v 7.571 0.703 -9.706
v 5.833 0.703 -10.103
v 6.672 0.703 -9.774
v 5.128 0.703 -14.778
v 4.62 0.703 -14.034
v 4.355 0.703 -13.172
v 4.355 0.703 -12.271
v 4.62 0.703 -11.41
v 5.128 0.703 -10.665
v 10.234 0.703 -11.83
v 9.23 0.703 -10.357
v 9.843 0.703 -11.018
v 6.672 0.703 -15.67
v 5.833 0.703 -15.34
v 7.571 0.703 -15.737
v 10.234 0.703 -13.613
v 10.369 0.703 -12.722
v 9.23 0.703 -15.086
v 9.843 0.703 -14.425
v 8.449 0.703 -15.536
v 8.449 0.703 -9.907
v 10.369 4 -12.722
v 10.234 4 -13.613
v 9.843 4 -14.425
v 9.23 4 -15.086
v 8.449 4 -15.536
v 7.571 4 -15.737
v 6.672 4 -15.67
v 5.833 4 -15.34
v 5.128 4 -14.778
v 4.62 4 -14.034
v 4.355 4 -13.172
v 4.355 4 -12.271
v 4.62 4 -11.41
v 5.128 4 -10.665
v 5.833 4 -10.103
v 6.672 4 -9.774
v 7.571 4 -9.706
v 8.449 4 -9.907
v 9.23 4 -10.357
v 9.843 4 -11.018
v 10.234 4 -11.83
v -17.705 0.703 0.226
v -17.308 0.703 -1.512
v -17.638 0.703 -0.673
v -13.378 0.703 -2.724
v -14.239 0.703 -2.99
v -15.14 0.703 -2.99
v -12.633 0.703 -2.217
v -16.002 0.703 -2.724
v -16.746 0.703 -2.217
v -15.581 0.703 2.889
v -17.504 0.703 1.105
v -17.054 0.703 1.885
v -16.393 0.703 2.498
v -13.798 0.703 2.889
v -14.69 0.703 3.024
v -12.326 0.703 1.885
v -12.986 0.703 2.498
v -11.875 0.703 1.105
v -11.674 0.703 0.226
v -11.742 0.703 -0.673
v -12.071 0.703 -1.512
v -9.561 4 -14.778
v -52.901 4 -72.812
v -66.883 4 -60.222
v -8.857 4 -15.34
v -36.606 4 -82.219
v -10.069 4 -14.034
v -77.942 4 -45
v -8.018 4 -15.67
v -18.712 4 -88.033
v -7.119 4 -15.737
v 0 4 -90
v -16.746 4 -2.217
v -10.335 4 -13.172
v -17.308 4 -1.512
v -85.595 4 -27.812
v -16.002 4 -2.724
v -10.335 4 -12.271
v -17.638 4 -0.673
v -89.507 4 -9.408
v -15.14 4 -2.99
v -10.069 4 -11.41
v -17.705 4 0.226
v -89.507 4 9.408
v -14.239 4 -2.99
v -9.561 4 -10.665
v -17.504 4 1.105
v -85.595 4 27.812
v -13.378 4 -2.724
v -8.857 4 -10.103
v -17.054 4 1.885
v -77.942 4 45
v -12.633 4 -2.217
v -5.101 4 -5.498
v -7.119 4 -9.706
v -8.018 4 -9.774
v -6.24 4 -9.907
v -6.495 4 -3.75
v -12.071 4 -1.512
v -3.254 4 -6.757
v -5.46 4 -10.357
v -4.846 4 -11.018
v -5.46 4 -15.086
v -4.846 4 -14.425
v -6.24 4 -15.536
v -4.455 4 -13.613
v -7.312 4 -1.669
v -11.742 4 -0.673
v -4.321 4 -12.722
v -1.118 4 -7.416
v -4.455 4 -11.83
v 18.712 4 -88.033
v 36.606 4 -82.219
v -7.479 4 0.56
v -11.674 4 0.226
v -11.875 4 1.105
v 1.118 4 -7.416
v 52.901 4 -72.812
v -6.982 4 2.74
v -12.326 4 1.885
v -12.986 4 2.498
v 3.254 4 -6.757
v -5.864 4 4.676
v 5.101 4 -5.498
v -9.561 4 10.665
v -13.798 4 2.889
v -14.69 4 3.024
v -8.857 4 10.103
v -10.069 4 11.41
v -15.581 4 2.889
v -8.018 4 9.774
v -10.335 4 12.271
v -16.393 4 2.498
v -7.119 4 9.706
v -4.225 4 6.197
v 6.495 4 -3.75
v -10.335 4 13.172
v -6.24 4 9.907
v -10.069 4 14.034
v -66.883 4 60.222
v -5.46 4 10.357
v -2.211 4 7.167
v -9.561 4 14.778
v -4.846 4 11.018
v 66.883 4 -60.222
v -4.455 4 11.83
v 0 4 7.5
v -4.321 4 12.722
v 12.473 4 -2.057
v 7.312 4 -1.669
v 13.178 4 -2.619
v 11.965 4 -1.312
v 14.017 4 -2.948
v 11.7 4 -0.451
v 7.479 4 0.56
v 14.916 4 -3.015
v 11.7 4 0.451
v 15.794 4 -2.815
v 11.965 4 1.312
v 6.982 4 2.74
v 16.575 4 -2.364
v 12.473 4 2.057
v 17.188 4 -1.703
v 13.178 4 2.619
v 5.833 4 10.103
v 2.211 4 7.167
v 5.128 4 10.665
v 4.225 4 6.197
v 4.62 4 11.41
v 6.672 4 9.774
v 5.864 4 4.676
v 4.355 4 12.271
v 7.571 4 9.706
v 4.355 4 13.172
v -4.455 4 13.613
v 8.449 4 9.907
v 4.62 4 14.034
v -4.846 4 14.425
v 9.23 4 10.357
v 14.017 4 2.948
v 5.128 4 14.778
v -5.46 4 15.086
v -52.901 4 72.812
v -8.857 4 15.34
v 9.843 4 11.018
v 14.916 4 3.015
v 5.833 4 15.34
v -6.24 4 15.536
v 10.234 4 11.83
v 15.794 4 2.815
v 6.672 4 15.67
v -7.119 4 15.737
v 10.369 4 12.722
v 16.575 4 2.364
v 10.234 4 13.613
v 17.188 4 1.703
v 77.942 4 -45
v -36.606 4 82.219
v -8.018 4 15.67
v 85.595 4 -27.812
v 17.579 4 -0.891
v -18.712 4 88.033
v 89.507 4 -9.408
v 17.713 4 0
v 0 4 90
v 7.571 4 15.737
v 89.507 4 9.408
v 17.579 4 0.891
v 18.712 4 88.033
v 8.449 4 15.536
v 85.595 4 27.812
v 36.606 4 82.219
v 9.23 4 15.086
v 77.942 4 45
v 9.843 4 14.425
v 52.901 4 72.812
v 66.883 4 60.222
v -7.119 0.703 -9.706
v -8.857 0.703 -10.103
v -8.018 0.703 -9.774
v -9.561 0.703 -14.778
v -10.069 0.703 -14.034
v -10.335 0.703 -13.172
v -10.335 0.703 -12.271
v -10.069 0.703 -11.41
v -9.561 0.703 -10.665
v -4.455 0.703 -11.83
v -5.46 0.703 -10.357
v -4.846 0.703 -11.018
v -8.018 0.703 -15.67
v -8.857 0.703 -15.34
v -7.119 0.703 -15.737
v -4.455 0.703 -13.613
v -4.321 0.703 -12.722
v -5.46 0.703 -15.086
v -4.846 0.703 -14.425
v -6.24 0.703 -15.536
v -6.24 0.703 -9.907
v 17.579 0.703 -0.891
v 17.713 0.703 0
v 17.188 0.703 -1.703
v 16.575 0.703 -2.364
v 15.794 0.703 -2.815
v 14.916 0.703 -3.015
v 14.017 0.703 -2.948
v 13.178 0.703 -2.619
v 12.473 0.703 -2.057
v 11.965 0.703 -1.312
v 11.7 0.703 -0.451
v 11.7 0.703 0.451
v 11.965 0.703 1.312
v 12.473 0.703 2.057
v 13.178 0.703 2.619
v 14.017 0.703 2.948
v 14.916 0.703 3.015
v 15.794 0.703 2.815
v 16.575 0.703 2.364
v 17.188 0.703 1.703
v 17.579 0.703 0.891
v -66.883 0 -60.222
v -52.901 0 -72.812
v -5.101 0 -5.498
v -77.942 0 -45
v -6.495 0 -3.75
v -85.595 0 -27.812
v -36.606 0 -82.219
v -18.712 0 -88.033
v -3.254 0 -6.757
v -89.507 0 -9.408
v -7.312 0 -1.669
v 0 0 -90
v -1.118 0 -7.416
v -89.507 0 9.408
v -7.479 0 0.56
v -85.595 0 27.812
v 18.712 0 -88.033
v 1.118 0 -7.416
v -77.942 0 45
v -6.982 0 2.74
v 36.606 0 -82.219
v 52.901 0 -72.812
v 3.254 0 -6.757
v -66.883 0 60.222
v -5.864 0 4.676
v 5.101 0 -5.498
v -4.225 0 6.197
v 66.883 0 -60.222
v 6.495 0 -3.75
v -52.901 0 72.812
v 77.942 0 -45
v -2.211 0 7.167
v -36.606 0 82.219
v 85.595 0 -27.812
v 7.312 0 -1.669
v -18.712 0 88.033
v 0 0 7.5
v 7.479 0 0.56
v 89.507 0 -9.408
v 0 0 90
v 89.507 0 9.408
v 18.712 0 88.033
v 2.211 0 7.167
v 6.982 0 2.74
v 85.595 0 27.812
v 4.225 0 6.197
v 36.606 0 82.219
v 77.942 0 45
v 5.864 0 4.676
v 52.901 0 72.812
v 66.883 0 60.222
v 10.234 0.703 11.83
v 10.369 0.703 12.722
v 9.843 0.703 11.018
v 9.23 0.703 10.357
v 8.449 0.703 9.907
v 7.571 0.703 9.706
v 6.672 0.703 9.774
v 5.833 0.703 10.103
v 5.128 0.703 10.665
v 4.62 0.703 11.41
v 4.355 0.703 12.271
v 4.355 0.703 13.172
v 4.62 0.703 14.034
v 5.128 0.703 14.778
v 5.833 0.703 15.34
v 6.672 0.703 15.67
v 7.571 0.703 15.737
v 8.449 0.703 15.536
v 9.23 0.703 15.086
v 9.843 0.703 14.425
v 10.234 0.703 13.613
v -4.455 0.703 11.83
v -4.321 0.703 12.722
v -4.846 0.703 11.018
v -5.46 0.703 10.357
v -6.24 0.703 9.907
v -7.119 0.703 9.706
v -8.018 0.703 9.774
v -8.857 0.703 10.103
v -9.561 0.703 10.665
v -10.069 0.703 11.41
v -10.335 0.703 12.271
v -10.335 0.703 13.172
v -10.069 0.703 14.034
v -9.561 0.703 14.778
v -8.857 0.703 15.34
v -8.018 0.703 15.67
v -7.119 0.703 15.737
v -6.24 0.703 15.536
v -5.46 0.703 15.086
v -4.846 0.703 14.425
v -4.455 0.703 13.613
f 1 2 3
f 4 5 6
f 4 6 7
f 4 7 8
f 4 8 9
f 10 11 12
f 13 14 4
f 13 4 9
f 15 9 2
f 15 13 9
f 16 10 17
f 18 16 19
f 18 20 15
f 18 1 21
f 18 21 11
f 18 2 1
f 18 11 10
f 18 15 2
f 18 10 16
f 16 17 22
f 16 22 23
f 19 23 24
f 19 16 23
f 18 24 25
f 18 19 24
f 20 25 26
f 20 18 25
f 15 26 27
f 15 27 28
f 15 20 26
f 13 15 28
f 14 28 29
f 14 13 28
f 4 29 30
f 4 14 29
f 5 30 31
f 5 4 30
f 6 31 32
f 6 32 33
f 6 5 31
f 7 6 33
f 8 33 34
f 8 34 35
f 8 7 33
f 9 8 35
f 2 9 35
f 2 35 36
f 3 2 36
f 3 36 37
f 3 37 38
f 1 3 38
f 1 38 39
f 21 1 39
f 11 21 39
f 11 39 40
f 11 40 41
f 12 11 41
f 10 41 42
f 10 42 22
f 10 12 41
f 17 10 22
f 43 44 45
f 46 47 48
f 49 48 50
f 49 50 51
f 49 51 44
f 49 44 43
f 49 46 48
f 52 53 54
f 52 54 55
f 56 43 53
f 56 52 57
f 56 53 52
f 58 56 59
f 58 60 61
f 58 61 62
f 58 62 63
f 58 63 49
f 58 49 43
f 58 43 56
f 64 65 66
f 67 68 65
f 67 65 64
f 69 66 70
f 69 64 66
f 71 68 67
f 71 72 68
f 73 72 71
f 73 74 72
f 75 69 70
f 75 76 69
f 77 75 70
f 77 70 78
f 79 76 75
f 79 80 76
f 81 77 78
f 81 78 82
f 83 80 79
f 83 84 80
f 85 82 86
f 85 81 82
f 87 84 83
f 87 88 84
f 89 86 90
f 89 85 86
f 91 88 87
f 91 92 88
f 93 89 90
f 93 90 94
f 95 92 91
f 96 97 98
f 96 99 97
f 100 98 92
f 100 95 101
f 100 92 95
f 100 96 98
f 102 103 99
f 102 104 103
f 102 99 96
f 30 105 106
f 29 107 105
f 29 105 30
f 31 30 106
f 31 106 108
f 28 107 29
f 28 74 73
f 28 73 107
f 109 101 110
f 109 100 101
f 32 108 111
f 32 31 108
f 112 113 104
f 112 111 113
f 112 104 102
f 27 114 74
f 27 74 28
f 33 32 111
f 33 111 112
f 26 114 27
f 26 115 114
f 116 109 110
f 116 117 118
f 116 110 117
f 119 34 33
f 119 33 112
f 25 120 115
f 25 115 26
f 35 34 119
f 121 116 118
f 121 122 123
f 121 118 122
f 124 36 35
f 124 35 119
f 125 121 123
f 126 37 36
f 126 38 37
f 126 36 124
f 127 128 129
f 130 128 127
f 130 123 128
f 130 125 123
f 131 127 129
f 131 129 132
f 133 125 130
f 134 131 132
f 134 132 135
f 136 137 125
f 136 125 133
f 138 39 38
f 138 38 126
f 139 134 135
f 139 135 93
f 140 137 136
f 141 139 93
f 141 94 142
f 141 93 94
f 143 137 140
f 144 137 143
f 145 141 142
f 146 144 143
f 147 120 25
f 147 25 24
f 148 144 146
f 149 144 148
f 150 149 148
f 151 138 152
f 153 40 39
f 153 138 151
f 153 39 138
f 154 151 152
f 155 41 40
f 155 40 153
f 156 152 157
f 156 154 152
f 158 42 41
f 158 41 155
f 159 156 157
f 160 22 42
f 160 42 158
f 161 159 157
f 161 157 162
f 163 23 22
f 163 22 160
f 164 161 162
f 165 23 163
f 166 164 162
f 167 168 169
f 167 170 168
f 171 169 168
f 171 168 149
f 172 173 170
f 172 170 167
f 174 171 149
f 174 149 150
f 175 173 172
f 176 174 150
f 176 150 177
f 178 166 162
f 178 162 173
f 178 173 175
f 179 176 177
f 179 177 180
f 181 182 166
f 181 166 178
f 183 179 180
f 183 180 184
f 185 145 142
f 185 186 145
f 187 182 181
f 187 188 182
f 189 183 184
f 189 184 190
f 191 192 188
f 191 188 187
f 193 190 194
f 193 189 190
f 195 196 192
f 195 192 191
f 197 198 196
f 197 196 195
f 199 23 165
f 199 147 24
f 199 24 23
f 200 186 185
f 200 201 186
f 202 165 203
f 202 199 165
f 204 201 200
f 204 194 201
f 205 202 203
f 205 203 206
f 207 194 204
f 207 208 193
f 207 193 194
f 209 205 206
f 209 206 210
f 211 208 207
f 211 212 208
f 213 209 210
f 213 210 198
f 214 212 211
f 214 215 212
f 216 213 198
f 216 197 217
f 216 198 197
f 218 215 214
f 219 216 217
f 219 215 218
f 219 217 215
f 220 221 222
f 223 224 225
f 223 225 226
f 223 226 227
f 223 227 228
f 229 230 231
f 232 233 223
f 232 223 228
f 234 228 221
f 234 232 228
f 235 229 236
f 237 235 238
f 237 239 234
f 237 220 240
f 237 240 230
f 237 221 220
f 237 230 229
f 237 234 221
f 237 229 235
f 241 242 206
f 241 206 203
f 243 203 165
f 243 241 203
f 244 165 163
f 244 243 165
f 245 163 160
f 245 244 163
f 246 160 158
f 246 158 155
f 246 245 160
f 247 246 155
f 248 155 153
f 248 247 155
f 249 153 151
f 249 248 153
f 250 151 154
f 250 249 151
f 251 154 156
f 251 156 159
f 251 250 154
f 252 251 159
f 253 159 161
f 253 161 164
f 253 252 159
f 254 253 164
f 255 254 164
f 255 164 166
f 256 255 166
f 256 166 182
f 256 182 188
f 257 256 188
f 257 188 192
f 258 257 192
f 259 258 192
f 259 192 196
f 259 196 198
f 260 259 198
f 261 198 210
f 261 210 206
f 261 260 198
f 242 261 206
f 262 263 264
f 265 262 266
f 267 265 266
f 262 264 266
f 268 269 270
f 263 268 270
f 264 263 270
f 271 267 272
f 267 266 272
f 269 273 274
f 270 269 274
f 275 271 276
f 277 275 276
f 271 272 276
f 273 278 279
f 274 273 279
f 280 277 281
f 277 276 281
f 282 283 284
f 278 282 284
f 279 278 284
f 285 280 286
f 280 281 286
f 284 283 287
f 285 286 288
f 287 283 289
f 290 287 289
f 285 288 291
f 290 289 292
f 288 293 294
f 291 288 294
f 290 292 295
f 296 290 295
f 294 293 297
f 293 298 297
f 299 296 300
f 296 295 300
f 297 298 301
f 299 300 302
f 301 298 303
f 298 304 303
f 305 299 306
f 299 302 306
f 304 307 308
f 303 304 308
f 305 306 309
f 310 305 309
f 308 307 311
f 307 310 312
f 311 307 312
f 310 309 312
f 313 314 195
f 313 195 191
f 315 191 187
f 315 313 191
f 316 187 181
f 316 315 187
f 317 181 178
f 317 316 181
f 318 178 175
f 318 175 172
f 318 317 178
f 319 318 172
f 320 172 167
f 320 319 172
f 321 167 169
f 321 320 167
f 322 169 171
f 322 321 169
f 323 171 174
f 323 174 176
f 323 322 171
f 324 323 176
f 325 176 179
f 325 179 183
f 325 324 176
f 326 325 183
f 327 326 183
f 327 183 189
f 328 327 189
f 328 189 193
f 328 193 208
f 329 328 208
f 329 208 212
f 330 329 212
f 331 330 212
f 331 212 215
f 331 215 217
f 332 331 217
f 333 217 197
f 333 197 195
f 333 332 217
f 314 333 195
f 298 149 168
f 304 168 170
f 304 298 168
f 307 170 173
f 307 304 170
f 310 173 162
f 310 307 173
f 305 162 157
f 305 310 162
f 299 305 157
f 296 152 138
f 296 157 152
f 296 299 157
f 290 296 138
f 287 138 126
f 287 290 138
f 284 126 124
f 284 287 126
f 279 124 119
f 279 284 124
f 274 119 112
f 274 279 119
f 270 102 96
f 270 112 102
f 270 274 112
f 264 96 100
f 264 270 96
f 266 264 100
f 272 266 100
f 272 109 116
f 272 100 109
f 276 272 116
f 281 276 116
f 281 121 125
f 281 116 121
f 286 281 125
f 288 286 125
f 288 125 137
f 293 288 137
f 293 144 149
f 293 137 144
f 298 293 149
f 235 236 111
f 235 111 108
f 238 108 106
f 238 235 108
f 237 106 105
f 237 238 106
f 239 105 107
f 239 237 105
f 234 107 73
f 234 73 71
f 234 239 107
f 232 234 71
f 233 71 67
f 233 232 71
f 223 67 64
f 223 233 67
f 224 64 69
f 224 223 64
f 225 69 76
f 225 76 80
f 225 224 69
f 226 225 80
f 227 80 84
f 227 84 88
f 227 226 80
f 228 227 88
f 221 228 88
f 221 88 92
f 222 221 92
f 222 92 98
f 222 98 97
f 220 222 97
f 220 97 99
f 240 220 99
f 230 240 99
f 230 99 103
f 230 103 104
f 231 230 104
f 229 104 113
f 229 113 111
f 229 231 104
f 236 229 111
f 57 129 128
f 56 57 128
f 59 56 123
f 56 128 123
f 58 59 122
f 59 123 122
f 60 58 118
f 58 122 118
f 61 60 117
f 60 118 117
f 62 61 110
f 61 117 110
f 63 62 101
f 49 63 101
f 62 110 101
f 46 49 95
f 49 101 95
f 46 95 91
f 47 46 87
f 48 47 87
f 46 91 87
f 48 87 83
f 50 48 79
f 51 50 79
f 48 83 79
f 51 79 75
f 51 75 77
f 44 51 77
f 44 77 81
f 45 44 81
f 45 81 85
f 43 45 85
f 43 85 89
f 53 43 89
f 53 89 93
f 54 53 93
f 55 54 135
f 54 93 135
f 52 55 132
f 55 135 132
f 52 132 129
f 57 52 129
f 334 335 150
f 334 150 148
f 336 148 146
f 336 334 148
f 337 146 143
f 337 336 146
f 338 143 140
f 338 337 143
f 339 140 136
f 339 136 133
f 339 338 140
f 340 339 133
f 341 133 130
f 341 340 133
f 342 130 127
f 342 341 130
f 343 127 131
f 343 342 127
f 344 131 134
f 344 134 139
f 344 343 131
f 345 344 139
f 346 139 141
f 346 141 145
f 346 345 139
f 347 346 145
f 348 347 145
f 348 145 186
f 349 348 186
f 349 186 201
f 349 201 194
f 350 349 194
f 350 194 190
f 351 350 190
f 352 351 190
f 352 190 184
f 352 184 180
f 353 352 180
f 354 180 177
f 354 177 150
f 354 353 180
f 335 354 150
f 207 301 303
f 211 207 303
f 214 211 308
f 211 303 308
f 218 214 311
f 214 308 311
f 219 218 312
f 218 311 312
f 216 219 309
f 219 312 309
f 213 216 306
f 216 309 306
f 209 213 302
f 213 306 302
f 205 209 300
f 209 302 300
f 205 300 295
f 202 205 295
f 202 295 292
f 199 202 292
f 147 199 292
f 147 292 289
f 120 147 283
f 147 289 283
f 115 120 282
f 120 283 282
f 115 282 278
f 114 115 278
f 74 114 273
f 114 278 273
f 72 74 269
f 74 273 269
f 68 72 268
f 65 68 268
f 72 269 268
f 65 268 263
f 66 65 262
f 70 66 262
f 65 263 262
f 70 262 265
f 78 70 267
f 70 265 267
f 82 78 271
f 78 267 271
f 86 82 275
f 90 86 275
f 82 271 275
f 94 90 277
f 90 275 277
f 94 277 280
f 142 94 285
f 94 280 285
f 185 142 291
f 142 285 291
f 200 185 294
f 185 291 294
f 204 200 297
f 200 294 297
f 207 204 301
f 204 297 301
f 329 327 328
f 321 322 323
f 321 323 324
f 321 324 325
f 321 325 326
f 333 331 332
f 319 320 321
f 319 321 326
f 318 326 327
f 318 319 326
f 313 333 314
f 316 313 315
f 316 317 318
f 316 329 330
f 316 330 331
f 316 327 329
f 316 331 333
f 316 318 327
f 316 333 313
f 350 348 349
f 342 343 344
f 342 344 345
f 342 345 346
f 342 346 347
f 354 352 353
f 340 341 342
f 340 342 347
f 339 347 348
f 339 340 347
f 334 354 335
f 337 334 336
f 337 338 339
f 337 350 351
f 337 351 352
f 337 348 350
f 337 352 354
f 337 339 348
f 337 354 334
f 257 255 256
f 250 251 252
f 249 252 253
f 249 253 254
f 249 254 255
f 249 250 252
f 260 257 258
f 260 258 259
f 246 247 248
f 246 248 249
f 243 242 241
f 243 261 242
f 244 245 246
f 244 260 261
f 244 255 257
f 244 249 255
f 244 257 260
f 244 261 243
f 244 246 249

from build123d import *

# Parameters (mm, degrees)
SKETCH1_R           = 90
BOSS_EXTRUDE1_DEPTH = 4
SKETCH2_R           = 7.5
CUT_EXTRUDE1_DEPTH  = 128.342059038
SKETCH3_R           = 3.023767703
CUT_EXTRUDE2_DEPTH  = 3.297005777
CIRPATTERN1_COUNT   = 6


with BuildPart() as part:
    # Sketch1 → Boss-Extrude1 (new body)
    with BuildSketch(Plane(origin=(0, 0, 0), x_dir=(1, 0, 0), z_dir=(0, 1, 0))):
        Circle(SKETCH1_R)
    extrude(amount=BOSS_EXTRUDE1_DEPTH)

    # Sketch2 → Cut-Extrude1 (cut, through all)
    with BuildSketch(Plane(origin=(0, 0, 0), x_dir=(1, 0, 0), z_dir=(0, 1, 0))):
        Circle(SKETCH2_R)
    extrude(amount=CUT_EXTRUDE1_DEPTH, mode=Mode.SUBTRACT)

    # Sketch3 → Cut-Extrude2 (cut)
    with BuildSketch(Plane(origin=(0, 4, 0), x_dir=(1, 0, 0), z_dir=(0, 1, 0))):
        with Locations((-14.689580211, 0)):
            Circle(SKETCH3_R)
    cut_extrude2 = extrude(amount=-CUT_EXTRUDE2_DEPTH, mode=Mode.SUBTRACT)

    # CirPattern1: Cut-Extrude2 ×6 about axis
    cirpattern1_axis = Axis((0, 0, 0), (0, 1, 0))
    for i in range(1, CIRPATTERN1_COUNT):
        add(cut_extrude2.rotate(cirpattern1_axis, i * 360 / CIRPATTERN1_COUNT), mode=Mode.SUBTRACT)


solid = part.part
